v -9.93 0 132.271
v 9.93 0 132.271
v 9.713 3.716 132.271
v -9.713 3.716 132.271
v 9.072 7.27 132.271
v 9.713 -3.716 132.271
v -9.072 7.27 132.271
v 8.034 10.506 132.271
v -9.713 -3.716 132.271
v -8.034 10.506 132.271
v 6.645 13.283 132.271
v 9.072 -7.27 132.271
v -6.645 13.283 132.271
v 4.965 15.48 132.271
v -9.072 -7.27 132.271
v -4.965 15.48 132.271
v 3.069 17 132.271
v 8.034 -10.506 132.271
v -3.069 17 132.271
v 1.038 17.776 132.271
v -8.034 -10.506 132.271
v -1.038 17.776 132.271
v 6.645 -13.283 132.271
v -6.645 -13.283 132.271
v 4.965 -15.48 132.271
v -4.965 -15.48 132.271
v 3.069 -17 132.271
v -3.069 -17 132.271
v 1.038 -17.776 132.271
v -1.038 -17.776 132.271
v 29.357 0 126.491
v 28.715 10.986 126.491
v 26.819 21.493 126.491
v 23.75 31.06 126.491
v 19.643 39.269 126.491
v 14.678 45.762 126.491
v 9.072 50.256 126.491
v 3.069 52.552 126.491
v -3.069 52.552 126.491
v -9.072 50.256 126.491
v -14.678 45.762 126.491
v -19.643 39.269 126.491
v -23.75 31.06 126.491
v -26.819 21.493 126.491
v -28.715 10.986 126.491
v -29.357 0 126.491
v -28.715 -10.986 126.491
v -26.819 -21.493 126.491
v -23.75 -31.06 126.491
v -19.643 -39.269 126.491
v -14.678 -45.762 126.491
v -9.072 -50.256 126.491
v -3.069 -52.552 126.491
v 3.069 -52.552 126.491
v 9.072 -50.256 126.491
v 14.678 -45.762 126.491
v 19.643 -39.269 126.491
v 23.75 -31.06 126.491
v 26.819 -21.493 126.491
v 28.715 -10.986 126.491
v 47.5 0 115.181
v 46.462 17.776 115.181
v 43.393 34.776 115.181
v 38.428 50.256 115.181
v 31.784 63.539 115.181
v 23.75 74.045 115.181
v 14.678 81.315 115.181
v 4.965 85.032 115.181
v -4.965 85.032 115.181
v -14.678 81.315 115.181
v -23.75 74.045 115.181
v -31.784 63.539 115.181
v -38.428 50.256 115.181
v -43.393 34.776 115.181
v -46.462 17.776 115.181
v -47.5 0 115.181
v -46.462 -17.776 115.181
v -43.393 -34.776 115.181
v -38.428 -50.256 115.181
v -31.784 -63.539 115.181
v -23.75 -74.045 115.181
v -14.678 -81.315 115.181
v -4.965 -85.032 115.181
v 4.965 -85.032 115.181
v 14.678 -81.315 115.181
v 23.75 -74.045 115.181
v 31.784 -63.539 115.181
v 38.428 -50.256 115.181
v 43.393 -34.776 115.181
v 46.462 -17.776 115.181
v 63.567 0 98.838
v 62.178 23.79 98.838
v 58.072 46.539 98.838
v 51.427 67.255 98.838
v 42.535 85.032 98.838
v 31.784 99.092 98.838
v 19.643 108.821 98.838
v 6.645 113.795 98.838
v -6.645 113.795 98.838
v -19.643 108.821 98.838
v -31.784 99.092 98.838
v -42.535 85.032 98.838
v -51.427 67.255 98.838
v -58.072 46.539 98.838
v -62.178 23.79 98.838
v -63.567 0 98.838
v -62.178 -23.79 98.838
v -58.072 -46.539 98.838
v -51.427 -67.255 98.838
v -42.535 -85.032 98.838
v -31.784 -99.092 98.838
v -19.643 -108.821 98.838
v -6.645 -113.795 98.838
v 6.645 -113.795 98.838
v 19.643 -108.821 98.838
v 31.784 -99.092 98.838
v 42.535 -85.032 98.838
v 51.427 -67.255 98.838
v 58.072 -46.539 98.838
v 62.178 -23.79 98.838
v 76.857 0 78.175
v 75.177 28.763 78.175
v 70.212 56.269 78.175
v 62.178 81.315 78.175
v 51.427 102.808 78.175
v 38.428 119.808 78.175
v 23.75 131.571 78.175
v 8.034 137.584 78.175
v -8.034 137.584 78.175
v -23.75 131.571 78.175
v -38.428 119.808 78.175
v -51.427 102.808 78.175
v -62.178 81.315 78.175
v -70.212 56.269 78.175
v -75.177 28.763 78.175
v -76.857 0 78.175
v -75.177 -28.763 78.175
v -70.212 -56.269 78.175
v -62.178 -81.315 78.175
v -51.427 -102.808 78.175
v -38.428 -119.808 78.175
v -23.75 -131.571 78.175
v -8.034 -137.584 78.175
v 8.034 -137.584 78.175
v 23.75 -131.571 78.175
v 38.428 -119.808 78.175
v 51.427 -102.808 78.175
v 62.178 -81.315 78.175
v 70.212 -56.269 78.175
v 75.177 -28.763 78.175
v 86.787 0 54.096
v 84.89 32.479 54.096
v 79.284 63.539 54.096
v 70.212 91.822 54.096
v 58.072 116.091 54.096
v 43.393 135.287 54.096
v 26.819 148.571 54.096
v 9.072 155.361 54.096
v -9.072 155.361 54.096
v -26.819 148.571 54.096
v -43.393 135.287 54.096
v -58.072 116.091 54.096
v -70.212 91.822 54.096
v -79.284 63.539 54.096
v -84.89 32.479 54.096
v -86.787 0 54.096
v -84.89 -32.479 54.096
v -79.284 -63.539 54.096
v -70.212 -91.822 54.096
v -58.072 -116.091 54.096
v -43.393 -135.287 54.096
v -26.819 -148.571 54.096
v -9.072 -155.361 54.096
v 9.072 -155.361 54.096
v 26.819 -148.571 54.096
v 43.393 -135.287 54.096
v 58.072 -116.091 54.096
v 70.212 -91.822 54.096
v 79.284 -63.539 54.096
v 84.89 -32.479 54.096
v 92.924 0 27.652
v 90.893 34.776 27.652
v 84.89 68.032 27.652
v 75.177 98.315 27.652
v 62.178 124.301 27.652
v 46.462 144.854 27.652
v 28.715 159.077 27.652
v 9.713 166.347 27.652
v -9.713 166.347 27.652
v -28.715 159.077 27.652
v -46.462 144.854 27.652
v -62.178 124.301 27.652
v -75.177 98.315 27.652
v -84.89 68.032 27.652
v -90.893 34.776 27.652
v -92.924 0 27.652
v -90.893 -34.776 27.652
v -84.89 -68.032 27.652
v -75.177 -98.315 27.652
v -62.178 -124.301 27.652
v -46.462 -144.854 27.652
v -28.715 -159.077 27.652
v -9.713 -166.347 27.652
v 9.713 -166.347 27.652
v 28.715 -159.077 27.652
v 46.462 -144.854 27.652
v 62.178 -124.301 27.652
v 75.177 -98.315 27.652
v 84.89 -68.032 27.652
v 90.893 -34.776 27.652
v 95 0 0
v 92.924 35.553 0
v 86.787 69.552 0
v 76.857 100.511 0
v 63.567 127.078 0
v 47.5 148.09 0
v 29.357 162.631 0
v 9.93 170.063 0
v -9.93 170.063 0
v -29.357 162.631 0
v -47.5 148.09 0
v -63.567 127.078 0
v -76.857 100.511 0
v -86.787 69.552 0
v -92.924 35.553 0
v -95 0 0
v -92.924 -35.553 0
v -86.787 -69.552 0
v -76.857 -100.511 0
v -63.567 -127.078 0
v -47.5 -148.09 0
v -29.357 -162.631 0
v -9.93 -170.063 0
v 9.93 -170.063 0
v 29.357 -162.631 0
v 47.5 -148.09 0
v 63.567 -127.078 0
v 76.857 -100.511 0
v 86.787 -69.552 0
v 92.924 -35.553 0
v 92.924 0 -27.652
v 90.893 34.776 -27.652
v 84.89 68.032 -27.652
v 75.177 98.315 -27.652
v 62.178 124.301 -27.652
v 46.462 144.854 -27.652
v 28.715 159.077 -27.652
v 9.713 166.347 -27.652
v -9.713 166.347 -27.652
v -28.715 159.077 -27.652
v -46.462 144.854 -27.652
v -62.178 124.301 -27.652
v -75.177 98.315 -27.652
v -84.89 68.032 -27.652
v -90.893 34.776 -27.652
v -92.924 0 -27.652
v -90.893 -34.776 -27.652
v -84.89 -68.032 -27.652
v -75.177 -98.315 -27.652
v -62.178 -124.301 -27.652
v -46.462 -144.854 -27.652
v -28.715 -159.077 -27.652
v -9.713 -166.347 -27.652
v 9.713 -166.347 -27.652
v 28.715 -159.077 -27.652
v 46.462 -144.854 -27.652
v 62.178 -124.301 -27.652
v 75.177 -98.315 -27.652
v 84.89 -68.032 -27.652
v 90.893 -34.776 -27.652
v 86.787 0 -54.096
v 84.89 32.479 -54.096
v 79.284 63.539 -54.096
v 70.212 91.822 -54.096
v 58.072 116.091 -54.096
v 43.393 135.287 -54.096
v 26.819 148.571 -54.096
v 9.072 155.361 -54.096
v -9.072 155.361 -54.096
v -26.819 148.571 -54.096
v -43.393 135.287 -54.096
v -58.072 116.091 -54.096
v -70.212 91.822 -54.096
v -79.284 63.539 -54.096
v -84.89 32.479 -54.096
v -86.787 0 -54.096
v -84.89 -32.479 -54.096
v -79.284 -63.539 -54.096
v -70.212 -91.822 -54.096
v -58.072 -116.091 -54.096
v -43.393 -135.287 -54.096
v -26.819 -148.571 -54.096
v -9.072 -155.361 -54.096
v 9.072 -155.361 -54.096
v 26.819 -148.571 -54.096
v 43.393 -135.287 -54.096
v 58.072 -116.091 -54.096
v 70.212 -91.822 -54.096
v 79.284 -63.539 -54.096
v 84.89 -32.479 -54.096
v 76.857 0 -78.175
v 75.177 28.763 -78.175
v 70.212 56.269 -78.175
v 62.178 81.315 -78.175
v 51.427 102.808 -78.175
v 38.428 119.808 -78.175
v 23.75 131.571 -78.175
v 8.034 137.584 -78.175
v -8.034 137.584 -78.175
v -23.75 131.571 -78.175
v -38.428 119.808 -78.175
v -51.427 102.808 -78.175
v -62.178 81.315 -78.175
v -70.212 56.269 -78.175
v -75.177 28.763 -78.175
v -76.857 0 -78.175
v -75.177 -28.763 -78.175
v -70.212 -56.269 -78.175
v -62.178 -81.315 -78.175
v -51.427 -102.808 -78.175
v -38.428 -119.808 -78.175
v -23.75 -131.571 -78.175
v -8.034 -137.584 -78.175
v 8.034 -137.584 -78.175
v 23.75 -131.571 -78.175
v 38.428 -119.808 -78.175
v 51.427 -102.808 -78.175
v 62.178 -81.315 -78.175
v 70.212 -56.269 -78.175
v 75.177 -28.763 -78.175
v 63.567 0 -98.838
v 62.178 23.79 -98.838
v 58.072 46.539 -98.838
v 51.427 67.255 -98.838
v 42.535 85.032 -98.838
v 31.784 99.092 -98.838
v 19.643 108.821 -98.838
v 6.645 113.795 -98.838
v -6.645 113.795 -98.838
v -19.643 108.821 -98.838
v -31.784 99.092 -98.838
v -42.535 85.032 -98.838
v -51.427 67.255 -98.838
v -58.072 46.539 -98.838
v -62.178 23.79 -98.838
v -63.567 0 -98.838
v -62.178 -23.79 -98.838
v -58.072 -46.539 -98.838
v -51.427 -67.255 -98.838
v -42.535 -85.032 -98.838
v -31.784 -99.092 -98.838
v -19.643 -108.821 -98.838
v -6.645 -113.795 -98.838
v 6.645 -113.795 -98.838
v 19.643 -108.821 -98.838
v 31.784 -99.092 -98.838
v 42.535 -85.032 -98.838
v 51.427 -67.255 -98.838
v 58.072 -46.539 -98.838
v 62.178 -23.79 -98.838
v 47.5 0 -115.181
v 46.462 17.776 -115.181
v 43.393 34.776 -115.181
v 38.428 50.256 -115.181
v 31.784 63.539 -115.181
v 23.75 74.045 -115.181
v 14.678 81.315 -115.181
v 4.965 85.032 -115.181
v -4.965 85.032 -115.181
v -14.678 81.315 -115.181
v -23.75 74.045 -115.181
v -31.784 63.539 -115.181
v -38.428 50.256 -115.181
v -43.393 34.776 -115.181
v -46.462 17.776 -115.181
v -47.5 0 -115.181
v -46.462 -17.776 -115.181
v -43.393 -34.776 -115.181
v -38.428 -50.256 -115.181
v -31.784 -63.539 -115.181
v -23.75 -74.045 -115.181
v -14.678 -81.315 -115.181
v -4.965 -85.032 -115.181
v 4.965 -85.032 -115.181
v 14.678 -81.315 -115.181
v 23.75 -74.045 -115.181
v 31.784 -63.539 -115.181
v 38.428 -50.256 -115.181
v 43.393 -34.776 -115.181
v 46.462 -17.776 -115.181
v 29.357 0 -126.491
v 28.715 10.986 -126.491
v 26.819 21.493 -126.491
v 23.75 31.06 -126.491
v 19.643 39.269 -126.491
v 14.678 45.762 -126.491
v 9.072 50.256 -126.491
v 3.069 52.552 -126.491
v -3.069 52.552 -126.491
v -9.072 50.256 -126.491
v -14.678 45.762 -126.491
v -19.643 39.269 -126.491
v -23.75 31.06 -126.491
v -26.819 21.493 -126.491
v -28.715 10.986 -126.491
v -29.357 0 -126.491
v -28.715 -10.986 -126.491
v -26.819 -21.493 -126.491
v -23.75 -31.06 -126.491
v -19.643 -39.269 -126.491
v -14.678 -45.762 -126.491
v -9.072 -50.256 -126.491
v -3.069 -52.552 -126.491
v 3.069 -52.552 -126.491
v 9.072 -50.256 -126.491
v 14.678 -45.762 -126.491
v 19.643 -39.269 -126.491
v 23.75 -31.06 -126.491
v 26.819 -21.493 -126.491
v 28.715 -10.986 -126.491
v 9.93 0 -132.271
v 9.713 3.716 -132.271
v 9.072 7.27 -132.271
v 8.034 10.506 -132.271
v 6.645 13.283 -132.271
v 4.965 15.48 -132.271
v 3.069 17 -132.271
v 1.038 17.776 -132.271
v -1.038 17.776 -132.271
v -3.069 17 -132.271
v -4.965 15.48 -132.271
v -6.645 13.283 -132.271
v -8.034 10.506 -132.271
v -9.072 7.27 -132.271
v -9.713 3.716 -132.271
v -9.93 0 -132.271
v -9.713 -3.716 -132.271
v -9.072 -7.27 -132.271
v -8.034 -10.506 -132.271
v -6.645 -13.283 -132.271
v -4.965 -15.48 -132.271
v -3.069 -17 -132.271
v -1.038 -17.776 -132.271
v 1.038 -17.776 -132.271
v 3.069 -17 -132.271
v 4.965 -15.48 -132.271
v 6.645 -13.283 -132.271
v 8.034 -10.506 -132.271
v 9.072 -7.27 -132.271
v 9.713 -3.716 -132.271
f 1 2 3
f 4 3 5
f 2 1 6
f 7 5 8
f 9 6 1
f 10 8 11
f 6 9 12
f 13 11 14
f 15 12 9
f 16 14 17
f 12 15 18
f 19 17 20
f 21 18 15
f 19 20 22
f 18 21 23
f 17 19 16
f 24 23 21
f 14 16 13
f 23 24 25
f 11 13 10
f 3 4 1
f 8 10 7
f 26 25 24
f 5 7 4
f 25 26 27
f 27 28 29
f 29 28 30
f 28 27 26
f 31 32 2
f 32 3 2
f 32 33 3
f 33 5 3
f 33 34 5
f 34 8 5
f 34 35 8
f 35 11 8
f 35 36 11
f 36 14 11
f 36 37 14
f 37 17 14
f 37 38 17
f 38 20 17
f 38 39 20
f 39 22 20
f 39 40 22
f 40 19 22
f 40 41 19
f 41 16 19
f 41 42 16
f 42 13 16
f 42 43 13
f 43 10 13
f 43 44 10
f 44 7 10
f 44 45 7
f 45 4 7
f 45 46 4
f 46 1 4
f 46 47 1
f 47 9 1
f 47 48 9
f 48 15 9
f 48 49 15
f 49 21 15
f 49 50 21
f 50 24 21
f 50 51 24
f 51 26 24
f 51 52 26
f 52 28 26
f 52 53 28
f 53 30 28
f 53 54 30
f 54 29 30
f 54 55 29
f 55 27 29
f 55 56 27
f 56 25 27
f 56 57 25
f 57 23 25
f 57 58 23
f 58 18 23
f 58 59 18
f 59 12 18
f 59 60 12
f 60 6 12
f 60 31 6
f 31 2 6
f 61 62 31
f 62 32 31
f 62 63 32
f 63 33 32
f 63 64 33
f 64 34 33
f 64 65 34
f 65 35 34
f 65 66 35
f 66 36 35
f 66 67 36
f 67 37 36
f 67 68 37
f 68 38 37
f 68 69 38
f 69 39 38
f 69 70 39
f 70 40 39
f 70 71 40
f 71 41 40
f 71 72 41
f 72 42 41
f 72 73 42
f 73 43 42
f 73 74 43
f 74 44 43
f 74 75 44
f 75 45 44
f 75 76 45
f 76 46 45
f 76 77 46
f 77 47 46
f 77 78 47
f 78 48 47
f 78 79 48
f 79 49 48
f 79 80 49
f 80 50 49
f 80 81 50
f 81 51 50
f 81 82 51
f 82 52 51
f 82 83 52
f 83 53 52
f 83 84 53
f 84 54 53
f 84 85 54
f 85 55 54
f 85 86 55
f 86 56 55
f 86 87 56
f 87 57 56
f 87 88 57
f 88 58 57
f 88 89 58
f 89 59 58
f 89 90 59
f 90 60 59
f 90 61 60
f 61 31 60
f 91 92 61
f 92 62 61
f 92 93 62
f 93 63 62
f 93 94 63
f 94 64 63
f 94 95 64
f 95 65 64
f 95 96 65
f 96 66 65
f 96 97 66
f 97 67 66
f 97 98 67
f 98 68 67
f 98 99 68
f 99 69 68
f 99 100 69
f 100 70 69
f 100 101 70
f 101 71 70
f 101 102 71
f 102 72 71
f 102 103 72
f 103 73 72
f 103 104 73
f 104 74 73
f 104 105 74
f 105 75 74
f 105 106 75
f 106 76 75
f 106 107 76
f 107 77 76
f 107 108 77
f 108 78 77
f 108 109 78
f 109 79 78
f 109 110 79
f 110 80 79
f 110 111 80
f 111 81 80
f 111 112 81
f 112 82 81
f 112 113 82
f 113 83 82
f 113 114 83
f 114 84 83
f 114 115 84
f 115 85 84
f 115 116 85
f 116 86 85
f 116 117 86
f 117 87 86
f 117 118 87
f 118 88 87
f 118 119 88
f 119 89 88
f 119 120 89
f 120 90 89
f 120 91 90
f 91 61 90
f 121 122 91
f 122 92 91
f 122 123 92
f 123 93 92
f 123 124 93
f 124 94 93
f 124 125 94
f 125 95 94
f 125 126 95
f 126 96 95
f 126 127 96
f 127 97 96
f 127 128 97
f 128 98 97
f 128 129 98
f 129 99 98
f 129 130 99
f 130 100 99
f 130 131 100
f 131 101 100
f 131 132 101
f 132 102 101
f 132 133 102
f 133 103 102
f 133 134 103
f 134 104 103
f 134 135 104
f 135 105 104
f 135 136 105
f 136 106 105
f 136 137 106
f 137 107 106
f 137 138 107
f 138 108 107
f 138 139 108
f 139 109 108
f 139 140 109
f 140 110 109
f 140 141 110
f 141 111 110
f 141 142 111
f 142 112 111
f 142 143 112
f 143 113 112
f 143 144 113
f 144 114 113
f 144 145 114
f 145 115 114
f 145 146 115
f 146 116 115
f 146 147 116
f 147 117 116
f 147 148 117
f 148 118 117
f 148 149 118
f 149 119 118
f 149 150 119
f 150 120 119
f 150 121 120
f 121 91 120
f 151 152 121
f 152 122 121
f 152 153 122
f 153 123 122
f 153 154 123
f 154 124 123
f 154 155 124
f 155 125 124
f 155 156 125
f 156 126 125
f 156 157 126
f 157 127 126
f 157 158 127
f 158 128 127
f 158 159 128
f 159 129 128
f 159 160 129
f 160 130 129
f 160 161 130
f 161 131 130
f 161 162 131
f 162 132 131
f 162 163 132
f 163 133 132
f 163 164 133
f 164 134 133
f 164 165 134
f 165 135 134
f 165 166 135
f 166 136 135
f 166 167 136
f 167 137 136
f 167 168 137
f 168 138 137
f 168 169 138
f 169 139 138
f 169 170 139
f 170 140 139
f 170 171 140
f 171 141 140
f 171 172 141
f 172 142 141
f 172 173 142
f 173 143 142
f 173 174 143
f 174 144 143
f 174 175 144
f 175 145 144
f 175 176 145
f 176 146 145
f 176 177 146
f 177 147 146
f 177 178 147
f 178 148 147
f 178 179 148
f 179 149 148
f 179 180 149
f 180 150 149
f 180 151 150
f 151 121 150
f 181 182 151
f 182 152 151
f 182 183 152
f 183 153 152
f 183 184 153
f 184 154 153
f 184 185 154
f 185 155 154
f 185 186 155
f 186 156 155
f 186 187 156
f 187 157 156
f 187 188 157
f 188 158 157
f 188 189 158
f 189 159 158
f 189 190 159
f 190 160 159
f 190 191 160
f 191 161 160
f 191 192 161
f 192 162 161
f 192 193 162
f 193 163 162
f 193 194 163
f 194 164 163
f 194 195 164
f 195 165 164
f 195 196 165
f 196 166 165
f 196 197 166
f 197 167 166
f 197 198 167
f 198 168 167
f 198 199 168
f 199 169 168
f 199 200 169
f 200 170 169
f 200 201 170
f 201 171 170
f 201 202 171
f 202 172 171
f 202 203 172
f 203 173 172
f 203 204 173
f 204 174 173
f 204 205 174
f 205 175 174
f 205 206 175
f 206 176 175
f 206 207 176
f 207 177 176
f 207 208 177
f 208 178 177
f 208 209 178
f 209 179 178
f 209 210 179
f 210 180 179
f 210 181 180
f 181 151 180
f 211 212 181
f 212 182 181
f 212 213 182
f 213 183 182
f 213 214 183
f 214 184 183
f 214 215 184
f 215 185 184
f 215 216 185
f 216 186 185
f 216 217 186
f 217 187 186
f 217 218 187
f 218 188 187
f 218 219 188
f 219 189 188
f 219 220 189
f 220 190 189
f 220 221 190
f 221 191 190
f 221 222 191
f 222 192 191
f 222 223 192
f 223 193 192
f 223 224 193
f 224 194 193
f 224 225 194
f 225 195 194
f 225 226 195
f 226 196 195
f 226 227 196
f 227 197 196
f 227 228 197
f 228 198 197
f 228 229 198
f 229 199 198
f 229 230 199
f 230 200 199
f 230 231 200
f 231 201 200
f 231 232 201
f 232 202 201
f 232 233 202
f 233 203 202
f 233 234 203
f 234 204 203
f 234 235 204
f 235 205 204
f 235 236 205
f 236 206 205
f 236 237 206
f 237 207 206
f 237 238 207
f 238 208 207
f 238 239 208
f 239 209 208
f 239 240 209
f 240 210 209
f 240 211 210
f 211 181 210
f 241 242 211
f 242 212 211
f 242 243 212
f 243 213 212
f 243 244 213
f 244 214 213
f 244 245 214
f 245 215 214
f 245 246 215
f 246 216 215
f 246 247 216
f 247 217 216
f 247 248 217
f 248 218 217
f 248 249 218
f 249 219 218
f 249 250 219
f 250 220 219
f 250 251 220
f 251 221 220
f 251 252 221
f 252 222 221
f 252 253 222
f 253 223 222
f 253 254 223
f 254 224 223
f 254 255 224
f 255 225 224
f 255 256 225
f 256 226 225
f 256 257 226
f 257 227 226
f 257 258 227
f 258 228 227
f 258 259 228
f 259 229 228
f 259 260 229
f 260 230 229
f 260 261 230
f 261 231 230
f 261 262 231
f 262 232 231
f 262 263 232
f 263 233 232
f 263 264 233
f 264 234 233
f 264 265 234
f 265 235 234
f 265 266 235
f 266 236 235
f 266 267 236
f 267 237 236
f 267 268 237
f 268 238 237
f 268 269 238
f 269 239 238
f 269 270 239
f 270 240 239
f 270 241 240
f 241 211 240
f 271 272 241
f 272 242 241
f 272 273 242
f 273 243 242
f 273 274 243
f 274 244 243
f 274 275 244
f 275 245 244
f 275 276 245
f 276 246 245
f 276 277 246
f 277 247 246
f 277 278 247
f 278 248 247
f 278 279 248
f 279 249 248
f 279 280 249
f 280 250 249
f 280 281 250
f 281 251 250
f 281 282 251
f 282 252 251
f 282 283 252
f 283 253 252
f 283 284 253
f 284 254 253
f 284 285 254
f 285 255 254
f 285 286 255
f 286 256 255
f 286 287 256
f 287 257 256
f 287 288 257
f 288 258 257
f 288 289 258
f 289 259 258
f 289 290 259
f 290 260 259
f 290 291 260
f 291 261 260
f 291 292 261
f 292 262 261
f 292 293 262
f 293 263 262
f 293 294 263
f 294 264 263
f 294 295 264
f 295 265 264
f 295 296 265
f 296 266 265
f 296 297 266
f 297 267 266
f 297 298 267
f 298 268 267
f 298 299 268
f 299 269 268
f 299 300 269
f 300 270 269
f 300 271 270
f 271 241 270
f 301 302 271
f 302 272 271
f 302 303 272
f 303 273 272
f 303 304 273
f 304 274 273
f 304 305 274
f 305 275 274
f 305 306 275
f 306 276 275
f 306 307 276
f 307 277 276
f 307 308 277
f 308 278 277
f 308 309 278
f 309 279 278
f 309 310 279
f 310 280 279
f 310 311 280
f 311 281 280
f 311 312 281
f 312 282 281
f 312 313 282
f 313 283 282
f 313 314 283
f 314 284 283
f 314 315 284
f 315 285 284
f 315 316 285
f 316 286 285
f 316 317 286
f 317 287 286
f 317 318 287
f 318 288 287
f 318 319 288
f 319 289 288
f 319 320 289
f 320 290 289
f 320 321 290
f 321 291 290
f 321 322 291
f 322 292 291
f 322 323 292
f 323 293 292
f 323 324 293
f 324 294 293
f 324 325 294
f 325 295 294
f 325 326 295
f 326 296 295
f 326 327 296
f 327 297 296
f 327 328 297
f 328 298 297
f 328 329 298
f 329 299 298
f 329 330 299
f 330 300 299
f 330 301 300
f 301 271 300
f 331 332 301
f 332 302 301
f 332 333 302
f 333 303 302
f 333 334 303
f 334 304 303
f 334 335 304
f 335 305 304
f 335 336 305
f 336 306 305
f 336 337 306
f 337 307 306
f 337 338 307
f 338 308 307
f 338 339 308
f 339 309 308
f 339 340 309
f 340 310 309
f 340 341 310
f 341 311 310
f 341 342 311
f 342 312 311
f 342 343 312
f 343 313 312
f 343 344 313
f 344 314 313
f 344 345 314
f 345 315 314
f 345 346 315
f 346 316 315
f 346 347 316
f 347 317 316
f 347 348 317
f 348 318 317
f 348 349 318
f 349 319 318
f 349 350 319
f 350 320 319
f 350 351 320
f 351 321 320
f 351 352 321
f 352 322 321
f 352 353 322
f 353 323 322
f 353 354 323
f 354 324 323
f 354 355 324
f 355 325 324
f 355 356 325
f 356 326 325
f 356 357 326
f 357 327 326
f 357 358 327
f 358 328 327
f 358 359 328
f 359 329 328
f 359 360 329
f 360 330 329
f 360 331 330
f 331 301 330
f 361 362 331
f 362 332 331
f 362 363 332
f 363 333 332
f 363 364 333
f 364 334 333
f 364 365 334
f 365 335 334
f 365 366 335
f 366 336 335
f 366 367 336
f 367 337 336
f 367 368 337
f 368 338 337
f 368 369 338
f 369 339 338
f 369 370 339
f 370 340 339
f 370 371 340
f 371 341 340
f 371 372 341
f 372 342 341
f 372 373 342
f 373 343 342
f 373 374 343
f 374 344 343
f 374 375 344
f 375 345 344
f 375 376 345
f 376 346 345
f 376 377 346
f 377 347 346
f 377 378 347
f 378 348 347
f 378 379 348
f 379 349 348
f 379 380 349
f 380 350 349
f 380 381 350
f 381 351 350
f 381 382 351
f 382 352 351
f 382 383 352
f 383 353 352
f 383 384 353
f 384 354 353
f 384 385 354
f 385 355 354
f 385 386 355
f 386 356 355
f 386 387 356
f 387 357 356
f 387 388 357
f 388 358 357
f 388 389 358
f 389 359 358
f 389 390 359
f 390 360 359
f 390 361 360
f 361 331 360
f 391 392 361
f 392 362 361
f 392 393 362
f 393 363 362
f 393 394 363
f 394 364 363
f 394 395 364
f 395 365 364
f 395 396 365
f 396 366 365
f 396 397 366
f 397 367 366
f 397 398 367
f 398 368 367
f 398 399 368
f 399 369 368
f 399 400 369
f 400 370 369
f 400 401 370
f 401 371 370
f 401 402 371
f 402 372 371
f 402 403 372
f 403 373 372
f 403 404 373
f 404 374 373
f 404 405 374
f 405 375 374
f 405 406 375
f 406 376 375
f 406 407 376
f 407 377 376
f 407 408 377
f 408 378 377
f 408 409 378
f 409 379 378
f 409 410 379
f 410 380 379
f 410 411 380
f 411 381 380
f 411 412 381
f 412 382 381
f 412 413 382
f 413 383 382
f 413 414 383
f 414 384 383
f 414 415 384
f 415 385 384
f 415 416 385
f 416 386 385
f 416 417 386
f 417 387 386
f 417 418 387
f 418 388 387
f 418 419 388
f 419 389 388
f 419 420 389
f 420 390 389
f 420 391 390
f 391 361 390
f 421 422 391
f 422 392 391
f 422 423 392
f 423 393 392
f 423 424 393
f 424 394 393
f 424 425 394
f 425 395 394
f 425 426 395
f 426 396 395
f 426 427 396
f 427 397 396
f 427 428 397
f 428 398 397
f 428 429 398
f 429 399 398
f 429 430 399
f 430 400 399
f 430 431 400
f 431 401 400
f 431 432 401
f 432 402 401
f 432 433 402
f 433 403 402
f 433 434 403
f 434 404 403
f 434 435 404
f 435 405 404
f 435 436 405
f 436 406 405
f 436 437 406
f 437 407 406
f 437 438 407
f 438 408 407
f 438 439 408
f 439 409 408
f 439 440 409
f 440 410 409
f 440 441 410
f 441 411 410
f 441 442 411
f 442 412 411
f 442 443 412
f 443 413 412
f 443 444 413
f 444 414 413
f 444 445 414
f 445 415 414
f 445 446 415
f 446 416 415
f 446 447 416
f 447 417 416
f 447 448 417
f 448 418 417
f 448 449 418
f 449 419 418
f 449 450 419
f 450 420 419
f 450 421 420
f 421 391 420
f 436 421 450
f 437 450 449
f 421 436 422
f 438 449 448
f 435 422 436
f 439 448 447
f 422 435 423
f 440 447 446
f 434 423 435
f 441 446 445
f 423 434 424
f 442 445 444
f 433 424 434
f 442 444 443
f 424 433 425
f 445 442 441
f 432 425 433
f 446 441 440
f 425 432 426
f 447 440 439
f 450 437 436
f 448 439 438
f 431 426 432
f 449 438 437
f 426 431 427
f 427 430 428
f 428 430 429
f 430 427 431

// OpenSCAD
// Generated by SolidPython 1.0.1 on 2020-07-29 00:46:46


scale(v = [5, 9, 7]) {
	sphere(r = 19);
}
/***********************************************
*********      SolidPython code:      **********
************************************************
 
# import packages: SolidPython
from solid import *
from solid.utils import *
from itertools import chain, combinations, permutations


class Resize:

    def __init__(self, scad_file):
        self.scad_file = scad_file
        #self.scad_file = import_scad(scad_file)
        # cone/cylinder param:
        self.r1 = 0
        self.r2 = 0
        self.h = 0
        # rectangular prism param:
        self.w = 0
        self.l = 0
        # ellipse param:
        self.r = 0

    # import OpenScad code (file name corresponds to shape)


    # classify shape + parameters
    def assign(self, param1, param2, param3):
        if self.scad_file == 'cone.scad':
            self.r1 = param1
            self.r2 = param2
            self.h = param3
        elif self.scad_file == 'cylinder.scad':
            self.r1 = param1
            self.r2 = param2
            self.h = param3
        elif self.scad_file == 'rectangularPrism.scad':
            self.h = param1
            self.l = param2
            self.w = param3
        else:
            self.r = param1
            self.h = param2

    # resize parameters
    def iterate(self):
        x = range(3, 20, 2)
        i = 1
        if self.scad_file == 'cone.scad':
            tempList = list(permutations(x, 2))
            for temp in tempList:
                param1 = temp[0]
                param2 = temp[1]
                filepath = 'produced_scad_files/' + 'cone' + str(param1) + '_' + str(param2) + '_' + '.scad'
                scad_render_to_file(cylinder(h=param1, r1=param2, r2=0), filepath)

        elif self.scad_file == 'cylinder.scad':
            tempList = list(permutations(x, 3))
            for temp in tempList:
                param1 = temp[0]
                param2 = temp[1]
                filepath = 'produced_scad_files/' + 'cylinder' + str(param1) + '_' + str(param2) + '_' + '.scad'
                scad_render_to_file(cylinder(h=param1, r1=param2, r2=param2), filepath)

        elif self.scad_file == 'rectangularPrism.scad':
            tempList = list(permutations(x, 3))
            for temp in tempList:
                param1 = temp[0]
                param2 = temp[1]
                param3 = temp[2]
                filepath = 'produced_scad_files/' + 'rectangularPrism' + str(param1) + '_' + str(param2) + '_' + str(
                    param3) + '.scad'
                scad_render_to_file(cube(size=(param1, param2, param3)), filepath)

        elif self.scad_file == 'ellipse.scad':
            tempList = list(permutations(x, 4))
            for temp in tempList:
                param1 = temp[0]
                param2 = temp[1]
                param3 = temp[2]
                param4 = temp[3]
                filepath = 'produced_scad_files/' + 'ellipse' + str(param1) + '_' + str(param2) + '_' + str(param3) + '_' + str(param4) + '.scad'
                scad_render_to_file(scale([param1, param2, param3])(sphere(r=param4)), filepath)

    def render_to_scadfile(self):
        scad_render_to_file(scad, 'example.scad') 
 
************************************************/
